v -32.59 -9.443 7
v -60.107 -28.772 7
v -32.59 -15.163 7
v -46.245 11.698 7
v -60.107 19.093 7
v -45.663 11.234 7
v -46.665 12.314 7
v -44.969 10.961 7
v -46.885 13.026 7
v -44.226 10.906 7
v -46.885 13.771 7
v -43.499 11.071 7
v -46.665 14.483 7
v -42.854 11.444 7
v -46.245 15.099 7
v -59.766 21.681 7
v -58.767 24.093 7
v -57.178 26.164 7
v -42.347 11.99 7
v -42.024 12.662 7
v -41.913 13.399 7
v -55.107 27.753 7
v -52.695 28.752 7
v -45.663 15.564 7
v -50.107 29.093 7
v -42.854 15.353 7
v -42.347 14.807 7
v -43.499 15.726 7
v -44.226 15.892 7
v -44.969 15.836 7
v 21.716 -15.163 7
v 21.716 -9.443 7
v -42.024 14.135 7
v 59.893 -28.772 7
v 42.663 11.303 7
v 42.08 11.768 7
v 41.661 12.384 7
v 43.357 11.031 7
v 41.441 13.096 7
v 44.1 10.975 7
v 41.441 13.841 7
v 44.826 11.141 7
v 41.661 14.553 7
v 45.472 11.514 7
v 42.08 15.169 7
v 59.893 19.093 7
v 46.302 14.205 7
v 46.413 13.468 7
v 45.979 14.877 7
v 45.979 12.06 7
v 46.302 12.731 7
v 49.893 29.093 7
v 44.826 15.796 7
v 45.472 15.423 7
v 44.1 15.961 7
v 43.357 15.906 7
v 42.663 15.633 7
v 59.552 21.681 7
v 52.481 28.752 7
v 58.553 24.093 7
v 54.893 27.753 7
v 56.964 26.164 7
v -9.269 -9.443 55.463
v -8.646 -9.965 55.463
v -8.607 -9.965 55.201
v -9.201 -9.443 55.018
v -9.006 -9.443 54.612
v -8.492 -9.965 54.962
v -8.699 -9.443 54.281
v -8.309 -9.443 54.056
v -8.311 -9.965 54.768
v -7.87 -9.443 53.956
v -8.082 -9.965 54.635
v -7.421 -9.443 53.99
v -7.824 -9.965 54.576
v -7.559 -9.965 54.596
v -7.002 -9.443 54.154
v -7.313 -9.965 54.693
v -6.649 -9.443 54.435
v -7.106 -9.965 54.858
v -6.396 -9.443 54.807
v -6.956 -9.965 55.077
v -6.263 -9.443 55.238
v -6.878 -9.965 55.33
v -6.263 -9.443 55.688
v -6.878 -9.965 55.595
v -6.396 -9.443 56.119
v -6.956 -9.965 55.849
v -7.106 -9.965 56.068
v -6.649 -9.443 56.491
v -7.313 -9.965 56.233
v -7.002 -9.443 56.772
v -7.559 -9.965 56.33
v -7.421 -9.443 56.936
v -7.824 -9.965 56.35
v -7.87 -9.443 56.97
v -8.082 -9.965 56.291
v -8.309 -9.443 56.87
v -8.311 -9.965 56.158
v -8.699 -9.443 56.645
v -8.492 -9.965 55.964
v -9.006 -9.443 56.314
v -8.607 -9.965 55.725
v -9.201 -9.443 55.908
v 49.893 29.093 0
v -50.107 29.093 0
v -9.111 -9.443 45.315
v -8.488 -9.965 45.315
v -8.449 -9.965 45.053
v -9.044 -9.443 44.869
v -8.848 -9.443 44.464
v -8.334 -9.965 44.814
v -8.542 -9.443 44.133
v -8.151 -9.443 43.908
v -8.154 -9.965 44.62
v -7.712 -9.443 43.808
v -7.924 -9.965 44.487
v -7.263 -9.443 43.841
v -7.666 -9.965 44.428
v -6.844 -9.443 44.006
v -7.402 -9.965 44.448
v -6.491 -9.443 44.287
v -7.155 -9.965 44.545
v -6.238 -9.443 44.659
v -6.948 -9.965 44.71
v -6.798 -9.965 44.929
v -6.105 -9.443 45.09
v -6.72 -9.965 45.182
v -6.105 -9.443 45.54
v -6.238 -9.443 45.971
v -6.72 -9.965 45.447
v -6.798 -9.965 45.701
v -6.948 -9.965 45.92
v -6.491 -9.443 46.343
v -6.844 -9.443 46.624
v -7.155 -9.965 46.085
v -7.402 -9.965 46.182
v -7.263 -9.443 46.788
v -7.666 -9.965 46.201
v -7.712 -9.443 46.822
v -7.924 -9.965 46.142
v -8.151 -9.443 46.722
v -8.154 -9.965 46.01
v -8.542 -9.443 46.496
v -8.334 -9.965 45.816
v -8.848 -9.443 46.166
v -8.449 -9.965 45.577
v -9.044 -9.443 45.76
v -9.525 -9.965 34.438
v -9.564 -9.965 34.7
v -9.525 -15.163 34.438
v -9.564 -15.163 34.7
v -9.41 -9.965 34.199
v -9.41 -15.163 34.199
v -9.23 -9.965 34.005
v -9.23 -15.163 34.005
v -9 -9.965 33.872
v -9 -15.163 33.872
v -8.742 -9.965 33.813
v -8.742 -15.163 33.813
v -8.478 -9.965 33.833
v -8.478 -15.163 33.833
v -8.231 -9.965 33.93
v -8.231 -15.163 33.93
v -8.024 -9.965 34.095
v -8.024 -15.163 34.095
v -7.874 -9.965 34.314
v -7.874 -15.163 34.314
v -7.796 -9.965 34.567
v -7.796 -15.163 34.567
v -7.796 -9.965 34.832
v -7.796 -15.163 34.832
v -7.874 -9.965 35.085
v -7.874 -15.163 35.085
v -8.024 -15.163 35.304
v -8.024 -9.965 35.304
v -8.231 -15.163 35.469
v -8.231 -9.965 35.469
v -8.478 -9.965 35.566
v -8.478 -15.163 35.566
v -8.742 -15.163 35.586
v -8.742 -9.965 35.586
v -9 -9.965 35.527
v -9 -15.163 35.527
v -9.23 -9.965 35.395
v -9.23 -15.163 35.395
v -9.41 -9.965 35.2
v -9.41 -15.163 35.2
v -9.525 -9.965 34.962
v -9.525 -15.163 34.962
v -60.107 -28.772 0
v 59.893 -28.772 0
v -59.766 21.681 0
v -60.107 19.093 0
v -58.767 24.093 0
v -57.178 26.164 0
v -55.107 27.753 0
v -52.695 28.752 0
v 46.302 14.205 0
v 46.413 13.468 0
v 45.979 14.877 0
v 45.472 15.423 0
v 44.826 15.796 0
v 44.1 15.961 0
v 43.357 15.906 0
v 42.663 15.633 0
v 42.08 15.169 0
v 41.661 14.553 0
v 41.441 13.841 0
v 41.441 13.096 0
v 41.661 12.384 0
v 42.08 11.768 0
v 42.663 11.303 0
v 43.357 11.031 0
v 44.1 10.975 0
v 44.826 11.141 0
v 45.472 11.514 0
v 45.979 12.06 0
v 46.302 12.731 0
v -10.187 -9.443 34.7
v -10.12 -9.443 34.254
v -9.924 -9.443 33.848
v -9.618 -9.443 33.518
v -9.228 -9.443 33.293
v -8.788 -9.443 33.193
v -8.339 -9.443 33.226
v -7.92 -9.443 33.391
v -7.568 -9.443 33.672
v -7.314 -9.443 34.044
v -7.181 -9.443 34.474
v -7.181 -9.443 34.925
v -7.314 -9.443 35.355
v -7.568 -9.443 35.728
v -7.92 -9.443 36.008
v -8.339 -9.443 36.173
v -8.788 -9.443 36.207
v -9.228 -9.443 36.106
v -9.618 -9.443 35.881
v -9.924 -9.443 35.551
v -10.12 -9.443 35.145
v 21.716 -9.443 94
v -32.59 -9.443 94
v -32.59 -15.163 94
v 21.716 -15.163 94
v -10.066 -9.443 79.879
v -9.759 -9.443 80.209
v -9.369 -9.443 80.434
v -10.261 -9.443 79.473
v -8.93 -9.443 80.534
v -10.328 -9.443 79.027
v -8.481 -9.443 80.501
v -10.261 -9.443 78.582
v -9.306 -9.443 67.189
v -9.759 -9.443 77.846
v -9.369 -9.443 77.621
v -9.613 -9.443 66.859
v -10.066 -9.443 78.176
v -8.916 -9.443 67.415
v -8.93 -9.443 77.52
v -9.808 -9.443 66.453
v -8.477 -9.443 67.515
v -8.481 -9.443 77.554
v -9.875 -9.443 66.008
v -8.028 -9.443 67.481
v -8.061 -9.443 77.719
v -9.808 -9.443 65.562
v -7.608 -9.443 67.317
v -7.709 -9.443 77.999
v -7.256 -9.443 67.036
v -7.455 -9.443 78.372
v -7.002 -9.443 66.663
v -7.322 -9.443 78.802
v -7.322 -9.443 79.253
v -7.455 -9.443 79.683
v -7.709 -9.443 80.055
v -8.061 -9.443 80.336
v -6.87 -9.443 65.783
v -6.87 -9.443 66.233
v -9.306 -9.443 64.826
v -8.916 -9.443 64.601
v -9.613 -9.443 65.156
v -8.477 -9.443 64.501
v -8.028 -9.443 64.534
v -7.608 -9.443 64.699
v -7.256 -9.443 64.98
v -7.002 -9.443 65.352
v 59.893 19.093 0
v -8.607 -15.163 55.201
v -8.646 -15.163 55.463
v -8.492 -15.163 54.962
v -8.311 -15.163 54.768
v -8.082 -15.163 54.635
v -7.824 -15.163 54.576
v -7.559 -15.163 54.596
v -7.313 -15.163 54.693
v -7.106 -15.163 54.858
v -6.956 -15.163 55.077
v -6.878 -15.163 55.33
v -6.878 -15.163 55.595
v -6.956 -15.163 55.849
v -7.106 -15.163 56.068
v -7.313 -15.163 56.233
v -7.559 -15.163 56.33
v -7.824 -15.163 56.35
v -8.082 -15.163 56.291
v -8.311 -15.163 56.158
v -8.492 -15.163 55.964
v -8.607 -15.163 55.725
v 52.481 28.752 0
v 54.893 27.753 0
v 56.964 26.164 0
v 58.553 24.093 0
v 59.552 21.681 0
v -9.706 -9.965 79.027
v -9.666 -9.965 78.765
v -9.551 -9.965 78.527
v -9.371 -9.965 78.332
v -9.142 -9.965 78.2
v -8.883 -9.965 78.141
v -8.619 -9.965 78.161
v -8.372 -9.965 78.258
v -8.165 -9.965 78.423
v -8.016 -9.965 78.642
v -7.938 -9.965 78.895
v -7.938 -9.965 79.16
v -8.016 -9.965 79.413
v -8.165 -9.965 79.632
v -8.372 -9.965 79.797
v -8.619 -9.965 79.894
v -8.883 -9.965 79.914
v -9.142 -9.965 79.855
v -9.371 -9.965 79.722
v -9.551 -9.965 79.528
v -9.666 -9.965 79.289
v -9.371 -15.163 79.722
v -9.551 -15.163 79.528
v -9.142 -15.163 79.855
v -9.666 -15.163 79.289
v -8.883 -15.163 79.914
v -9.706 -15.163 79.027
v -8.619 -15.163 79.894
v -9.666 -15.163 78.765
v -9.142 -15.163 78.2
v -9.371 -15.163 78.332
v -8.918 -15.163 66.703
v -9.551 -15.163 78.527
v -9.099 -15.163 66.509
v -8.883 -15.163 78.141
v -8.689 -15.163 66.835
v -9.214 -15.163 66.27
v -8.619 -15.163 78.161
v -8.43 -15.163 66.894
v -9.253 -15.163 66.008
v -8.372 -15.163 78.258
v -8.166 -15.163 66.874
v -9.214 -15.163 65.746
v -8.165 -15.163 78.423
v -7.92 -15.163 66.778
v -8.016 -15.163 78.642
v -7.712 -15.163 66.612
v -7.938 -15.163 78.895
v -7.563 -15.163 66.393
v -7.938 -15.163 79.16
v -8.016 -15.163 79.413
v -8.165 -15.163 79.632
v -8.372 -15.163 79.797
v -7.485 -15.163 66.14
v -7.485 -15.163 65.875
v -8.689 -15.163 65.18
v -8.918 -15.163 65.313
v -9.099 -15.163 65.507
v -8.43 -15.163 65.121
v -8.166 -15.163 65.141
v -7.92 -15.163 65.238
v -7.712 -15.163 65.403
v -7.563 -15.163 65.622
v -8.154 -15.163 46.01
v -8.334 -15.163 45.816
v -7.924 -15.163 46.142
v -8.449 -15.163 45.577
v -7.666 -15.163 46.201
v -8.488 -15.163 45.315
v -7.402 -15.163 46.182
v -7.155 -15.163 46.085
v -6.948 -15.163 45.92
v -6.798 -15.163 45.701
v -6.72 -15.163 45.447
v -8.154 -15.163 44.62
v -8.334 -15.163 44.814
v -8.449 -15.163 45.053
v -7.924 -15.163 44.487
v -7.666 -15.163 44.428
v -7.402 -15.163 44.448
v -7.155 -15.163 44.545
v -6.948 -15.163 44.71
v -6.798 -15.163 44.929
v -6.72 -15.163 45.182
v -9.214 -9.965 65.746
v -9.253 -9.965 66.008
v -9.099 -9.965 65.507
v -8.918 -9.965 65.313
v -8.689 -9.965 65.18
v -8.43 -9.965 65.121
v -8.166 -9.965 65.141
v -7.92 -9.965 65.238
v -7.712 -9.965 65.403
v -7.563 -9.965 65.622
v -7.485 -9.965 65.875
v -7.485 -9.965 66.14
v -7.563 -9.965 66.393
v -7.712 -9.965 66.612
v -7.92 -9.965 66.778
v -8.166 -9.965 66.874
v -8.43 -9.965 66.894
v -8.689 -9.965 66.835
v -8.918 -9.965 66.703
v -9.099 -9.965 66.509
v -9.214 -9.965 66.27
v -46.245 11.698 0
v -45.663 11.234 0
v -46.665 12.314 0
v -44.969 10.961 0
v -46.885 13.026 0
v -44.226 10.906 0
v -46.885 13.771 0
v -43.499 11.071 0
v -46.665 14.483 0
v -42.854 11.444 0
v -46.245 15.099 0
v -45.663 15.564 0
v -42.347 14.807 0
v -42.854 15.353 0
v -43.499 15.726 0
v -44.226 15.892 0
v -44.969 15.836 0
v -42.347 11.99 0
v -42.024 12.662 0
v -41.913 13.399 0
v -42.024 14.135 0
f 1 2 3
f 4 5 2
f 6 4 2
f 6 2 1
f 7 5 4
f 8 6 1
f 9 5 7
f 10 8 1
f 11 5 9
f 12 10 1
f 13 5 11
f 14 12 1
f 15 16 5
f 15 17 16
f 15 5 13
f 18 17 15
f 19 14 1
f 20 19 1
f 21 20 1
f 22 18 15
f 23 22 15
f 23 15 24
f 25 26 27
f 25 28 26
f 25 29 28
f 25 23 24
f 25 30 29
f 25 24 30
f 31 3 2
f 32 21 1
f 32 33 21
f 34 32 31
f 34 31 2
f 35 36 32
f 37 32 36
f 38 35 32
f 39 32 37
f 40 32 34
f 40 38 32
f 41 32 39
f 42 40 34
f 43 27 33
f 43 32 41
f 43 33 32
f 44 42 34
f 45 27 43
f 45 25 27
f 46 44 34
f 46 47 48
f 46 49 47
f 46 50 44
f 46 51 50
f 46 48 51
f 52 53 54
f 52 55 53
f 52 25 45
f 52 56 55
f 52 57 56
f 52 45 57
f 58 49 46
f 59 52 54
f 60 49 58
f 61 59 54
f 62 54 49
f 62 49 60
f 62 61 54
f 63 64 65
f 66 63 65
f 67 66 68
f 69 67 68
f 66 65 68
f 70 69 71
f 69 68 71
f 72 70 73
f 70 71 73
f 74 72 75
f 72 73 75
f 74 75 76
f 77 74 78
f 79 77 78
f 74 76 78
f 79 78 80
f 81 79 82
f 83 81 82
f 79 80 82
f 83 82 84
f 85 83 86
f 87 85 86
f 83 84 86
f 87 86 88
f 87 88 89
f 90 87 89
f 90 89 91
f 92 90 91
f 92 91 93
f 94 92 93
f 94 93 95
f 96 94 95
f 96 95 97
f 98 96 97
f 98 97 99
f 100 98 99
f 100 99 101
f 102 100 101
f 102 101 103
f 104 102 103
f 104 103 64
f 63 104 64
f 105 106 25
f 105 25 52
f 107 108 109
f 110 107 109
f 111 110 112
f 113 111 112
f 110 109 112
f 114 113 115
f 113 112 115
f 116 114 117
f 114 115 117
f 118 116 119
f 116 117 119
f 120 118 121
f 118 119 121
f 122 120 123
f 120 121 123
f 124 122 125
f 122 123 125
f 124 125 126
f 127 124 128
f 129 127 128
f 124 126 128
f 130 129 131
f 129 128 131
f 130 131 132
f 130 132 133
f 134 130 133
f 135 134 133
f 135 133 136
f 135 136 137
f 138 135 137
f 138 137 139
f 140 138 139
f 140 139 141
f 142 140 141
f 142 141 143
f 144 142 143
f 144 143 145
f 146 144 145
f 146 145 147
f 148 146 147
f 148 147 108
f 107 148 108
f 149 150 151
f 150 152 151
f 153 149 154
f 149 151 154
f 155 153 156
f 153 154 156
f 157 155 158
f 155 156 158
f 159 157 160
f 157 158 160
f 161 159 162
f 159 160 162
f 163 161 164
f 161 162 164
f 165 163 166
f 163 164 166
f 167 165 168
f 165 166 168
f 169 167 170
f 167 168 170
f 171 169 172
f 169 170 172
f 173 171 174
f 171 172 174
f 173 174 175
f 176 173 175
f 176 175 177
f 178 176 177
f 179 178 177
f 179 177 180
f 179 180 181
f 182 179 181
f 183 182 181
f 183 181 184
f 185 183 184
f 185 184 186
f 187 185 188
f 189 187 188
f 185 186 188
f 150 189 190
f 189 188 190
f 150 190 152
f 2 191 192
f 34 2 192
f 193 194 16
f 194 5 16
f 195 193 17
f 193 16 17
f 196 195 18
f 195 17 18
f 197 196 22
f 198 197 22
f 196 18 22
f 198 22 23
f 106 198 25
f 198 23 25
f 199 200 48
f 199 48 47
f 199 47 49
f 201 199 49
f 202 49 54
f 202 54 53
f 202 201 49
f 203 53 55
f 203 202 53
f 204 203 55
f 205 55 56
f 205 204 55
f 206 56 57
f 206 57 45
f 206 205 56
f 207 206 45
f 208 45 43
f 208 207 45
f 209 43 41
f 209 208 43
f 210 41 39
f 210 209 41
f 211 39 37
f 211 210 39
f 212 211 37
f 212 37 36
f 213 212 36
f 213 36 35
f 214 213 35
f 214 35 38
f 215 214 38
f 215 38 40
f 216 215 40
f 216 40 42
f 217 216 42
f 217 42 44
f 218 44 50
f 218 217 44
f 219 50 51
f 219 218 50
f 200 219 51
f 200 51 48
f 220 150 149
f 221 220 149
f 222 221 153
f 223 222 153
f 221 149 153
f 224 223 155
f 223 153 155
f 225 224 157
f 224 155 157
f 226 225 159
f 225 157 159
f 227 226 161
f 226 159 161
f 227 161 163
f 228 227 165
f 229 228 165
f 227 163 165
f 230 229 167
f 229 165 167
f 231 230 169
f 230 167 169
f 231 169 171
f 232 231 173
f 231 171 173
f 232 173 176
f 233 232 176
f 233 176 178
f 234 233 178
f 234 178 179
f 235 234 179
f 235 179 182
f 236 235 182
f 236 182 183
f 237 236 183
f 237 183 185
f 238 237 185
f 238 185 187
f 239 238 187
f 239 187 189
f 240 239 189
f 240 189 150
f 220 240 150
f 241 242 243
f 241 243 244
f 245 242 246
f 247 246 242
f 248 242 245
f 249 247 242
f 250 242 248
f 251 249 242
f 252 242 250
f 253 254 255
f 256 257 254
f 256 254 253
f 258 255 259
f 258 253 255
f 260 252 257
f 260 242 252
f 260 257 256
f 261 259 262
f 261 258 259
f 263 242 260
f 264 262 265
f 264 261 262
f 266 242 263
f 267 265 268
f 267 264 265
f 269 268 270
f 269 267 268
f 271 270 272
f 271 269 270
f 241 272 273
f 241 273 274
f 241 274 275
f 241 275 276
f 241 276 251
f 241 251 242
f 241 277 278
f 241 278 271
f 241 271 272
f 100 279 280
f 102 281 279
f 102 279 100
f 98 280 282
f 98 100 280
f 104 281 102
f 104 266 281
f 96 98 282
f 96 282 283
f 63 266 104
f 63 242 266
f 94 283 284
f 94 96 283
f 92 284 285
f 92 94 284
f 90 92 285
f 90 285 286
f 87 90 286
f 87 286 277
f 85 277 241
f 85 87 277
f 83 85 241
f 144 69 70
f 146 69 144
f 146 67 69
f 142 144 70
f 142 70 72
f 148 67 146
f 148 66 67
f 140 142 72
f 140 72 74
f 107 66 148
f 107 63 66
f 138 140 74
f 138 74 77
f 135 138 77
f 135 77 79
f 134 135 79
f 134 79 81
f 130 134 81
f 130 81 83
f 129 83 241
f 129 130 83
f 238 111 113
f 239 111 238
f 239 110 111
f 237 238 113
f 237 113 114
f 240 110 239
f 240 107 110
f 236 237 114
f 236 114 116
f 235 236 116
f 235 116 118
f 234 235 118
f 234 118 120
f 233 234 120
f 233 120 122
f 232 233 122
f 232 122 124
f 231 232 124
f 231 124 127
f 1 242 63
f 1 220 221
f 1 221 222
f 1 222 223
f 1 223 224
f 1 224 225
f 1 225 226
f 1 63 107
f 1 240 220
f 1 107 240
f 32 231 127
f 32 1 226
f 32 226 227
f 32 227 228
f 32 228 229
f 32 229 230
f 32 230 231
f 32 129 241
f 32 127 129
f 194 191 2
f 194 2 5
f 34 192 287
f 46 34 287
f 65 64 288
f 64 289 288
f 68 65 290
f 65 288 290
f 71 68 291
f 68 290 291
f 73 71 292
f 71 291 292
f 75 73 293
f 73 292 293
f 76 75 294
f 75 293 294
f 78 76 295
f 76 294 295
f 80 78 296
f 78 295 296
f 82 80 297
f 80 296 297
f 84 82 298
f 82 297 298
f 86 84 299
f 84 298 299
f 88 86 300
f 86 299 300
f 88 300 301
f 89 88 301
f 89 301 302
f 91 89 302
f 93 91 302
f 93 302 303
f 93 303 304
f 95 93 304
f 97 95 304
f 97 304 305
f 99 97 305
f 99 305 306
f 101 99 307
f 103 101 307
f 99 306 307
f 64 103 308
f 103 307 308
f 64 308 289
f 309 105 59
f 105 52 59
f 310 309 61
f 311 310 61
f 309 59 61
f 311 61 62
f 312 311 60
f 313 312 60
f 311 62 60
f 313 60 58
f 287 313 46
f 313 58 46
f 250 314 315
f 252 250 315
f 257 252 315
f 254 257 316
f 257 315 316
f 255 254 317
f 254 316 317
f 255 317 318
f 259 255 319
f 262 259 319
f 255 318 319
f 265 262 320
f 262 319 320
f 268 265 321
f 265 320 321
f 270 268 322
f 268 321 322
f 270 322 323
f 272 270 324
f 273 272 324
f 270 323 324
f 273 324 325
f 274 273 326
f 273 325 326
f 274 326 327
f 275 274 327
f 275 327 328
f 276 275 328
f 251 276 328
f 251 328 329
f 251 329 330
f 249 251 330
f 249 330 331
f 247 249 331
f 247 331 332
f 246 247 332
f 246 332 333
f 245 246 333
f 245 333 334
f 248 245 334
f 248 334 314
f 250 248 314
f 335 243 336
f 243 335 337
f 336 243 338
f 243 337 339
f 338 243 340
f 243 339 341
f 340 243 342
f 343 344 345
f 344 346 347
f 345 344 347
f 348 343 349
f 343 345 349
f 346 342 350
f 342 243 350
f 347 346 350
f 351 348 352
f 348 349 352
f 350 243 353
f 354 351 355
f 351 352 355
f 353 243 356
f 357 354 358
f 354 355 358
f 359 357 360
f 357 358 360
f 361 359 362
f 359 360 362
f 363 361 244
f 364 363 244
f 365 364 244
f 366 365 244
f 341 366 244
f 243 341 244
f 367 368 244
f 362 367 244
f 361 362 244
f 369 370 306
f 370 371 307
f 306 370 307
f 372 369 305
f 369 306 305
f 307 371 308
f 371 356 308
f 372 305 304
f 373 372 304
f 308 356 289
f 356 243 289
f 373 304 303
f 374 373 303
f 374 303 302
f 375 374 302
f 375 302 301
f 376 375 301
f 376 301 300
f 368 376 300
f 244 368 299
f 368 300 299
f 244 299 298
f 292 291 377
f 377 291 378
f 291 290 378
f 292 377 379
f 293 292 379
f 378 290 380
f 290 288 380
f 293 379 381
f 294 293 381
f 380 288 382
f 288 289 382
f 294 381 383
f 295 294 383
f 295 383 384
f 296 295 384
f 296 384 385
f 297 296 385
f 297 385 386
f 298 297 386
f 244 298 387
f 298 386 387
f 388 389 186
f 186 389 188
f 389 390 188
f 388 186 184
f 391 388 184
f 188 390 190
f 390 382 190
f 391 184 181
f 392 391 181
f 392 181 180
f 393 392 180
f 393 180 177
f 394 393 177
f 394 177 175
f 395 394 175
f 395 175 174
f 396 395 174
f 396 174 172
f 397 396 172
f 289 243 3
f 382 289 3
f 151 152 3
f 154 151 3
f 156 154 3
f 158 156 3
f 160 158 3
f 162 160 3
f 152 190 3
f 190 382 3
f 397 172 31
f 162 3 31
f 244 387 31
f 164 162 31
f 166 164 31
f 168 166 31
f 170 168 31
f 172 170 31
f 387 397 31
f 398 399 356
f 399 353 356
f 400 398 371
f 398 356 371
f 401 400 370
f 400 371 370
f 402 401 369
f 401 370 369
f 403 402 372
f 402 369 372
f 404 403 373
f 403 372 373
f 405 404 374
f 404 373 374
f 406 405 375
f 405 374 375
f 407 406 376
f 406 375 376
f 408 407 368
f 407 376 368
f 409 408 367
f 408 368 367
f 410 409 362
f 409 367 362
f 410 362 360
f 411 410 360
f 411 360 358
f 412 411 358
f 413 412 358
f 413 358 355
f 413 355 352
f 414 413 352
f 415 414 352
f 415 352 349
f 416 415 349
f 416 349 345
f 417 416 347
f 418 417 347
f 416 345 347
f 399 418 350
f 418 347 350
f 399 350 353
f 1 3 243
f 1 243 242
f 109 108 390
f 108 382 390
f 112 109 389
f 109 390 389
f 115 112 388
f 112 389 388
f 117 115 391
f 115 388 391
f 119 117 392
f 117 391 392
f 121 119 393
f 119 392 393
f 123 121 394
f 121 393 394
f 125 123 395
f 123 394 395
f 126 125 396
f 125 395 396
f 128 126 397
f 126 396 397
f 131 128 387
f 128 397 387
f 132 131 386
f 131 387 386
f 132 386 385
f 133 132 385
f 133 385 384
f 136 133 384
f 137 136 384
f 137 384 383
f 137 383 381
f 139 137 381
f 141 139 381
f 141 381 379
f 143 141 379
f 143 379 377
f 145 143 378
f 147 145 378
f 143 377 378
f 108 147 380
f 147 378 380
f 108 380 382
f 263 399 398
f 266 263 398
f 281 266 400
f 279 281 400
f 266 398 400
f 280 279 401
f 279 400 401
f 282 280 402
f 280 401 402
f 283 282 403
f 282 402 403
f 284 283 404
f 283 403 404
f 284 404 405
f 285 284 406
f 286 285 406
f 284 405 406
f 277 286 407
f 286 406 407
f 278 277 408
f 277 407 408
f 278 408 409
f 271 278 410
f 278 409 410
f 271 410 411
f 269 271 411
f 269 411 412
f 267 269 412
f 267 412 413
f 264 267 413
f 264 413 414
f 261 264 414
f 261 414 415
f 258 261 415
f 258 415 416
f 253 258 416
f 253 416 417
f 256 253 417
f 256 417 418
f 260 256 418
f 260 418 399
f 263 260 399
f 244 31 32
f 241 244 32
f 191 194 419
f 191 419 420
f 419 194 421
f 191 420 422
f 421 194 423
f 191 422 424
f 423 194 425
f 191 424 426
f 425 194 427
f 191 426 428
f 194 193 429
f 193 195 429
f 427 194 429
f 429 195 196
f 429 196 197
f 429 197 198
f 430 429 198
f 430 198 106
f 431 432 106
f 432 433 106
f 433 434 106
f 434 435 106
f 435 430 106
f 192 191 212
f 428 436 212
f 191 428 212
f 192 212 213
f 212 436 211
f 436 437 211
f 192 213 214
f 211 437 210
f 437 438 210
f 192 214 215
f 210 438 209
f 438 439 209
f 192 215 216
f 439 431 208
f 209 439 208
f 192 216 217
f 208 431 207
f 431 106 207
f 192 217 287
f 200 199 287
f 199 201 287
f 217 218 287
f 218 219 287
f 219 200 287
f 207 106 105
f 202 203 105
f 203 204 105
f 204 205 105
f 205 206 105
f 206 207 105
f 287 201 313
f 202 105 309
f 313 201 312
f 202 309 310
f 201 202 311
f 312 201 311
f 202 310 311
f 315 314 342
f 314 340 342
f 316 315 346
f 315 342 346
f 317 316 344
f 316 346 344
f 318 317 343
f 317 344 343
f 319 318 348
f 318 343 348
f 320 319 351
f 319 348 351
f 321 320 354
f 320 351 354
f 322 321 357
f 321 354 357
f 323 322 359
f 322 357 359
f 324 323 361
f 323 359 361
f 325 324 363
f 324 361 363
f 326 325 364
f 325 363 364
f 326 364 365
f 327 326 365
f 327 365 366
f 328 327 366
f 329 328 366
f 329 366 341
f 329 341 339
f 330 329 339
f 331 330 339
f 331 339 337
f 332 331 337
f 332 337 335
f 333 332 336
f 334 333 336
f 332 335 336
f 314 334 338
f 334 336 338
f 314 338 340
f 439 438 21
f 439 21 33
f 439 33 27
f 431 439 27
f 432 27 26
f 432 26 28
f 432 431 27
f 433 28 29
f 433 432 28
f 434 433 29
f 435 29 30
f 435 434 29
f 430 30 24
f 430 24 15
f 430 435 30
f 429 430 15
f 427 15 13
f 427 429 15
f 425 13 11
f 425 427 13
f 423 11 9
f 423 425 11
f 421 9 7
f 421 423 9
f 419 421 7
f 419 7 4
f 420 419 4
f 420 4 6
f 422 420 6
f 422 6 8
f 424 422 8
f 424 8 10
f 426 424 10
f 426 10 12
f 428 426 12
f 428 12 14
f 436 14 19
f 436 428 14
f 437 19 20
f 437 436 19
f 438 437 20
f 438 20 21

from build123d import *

# Parameters (mm, degrees)
SKETCH1_W                                         = 120
SKETCH1_H                                         = 57.864768683
SKETCH1_R                                         = 2.5
BOSS_EXTRUDE1_DEPTH                               = 7
SKETCH2_W                                         = 54.306051878
SKETCH2_H                                         = 5.719890942
BOSS_EXTRUDE2_DEPTH                               = 87
FILLET1_R                                         = 10
CSK_FOR_0_FLAT_HEAD_MACHINE_SCREW_100_D           = 1.778
CSK_FOR_0_FLAT_HEAD_MACHINE_SCREW_100_CSINK_D     = 3.0226
CSK_FOR_0_FLAT_HEAD_MACHINE_SCREW_100_CSINK_ANGLE = 100


with BuildPart() as part:
    # Sketch1 → Boss-Extrude1 (new body)
    with BuildSketch(Plane.XY):
        with Locations((-0.106761566, 0.160142349)):
            Rectangle(SKETCH1_W, SKETCH1_H)
        with Locations((-44.412811388, 13.398576512)):
            Circle(SKETCH1_R, mode=Mode.SUBTRACT)
        with Locations((43.912956959, 13.468374771)):
            Circle(SKETCH1_R, mode=Mode.SUBTRACT)
    extrude(amount=BOSS_EXTRUDE1_DEPTH)

    # Sketch2 → Boss-Extrude2 (add)
    with BuildSketch(Plane.XY.offset(7)):
        with Locations((-5.436912955, -12.302569894)):
            Rectangle(SKETCH2_W, SKETCH2_H)
    extrude(amount=BOSS_EXTRUDE2_DEPTH)

    # Fillet1
    fillet1_edges = [part.edges().sort_by_distance(p)[0] for p in [
        (-60.106761566, 29.09252669, 3.5),
        (59.893238434, 29.09252669, 3.5),
    ]]
    fillet(fillet1_edges, radius=FILLET1_R)

    # CSK for #0 Flat Head Machine Screw (100)1 (through all)
    with Locations(Plane(origin=(0, -9.442624423, 0), x_dir=(1, 0, 0), z_dir=(0, 1, 0))):
        with Locations((-8.675393381, -34.699580631), (-7.599346026, -45.314885455), (-7.757212548, -55.462997779), (-8.364022161, -66.007770116), (-8.816821696, -79.027415228)):
            CounterSinkHole(CSK_FOR_0_FLAT_HEAD_MACHINE_SCREW_100_D / 2, CSK_FOR_0_FLAT_HEAD_MACHINE_SCREW_100_CSINK_D / 2, counter_sink_angle=CSK_FOR_0_FLAT_HEAD_MACHINE_SCREW_100_CSINK_ANGLE)


solid = part.part
